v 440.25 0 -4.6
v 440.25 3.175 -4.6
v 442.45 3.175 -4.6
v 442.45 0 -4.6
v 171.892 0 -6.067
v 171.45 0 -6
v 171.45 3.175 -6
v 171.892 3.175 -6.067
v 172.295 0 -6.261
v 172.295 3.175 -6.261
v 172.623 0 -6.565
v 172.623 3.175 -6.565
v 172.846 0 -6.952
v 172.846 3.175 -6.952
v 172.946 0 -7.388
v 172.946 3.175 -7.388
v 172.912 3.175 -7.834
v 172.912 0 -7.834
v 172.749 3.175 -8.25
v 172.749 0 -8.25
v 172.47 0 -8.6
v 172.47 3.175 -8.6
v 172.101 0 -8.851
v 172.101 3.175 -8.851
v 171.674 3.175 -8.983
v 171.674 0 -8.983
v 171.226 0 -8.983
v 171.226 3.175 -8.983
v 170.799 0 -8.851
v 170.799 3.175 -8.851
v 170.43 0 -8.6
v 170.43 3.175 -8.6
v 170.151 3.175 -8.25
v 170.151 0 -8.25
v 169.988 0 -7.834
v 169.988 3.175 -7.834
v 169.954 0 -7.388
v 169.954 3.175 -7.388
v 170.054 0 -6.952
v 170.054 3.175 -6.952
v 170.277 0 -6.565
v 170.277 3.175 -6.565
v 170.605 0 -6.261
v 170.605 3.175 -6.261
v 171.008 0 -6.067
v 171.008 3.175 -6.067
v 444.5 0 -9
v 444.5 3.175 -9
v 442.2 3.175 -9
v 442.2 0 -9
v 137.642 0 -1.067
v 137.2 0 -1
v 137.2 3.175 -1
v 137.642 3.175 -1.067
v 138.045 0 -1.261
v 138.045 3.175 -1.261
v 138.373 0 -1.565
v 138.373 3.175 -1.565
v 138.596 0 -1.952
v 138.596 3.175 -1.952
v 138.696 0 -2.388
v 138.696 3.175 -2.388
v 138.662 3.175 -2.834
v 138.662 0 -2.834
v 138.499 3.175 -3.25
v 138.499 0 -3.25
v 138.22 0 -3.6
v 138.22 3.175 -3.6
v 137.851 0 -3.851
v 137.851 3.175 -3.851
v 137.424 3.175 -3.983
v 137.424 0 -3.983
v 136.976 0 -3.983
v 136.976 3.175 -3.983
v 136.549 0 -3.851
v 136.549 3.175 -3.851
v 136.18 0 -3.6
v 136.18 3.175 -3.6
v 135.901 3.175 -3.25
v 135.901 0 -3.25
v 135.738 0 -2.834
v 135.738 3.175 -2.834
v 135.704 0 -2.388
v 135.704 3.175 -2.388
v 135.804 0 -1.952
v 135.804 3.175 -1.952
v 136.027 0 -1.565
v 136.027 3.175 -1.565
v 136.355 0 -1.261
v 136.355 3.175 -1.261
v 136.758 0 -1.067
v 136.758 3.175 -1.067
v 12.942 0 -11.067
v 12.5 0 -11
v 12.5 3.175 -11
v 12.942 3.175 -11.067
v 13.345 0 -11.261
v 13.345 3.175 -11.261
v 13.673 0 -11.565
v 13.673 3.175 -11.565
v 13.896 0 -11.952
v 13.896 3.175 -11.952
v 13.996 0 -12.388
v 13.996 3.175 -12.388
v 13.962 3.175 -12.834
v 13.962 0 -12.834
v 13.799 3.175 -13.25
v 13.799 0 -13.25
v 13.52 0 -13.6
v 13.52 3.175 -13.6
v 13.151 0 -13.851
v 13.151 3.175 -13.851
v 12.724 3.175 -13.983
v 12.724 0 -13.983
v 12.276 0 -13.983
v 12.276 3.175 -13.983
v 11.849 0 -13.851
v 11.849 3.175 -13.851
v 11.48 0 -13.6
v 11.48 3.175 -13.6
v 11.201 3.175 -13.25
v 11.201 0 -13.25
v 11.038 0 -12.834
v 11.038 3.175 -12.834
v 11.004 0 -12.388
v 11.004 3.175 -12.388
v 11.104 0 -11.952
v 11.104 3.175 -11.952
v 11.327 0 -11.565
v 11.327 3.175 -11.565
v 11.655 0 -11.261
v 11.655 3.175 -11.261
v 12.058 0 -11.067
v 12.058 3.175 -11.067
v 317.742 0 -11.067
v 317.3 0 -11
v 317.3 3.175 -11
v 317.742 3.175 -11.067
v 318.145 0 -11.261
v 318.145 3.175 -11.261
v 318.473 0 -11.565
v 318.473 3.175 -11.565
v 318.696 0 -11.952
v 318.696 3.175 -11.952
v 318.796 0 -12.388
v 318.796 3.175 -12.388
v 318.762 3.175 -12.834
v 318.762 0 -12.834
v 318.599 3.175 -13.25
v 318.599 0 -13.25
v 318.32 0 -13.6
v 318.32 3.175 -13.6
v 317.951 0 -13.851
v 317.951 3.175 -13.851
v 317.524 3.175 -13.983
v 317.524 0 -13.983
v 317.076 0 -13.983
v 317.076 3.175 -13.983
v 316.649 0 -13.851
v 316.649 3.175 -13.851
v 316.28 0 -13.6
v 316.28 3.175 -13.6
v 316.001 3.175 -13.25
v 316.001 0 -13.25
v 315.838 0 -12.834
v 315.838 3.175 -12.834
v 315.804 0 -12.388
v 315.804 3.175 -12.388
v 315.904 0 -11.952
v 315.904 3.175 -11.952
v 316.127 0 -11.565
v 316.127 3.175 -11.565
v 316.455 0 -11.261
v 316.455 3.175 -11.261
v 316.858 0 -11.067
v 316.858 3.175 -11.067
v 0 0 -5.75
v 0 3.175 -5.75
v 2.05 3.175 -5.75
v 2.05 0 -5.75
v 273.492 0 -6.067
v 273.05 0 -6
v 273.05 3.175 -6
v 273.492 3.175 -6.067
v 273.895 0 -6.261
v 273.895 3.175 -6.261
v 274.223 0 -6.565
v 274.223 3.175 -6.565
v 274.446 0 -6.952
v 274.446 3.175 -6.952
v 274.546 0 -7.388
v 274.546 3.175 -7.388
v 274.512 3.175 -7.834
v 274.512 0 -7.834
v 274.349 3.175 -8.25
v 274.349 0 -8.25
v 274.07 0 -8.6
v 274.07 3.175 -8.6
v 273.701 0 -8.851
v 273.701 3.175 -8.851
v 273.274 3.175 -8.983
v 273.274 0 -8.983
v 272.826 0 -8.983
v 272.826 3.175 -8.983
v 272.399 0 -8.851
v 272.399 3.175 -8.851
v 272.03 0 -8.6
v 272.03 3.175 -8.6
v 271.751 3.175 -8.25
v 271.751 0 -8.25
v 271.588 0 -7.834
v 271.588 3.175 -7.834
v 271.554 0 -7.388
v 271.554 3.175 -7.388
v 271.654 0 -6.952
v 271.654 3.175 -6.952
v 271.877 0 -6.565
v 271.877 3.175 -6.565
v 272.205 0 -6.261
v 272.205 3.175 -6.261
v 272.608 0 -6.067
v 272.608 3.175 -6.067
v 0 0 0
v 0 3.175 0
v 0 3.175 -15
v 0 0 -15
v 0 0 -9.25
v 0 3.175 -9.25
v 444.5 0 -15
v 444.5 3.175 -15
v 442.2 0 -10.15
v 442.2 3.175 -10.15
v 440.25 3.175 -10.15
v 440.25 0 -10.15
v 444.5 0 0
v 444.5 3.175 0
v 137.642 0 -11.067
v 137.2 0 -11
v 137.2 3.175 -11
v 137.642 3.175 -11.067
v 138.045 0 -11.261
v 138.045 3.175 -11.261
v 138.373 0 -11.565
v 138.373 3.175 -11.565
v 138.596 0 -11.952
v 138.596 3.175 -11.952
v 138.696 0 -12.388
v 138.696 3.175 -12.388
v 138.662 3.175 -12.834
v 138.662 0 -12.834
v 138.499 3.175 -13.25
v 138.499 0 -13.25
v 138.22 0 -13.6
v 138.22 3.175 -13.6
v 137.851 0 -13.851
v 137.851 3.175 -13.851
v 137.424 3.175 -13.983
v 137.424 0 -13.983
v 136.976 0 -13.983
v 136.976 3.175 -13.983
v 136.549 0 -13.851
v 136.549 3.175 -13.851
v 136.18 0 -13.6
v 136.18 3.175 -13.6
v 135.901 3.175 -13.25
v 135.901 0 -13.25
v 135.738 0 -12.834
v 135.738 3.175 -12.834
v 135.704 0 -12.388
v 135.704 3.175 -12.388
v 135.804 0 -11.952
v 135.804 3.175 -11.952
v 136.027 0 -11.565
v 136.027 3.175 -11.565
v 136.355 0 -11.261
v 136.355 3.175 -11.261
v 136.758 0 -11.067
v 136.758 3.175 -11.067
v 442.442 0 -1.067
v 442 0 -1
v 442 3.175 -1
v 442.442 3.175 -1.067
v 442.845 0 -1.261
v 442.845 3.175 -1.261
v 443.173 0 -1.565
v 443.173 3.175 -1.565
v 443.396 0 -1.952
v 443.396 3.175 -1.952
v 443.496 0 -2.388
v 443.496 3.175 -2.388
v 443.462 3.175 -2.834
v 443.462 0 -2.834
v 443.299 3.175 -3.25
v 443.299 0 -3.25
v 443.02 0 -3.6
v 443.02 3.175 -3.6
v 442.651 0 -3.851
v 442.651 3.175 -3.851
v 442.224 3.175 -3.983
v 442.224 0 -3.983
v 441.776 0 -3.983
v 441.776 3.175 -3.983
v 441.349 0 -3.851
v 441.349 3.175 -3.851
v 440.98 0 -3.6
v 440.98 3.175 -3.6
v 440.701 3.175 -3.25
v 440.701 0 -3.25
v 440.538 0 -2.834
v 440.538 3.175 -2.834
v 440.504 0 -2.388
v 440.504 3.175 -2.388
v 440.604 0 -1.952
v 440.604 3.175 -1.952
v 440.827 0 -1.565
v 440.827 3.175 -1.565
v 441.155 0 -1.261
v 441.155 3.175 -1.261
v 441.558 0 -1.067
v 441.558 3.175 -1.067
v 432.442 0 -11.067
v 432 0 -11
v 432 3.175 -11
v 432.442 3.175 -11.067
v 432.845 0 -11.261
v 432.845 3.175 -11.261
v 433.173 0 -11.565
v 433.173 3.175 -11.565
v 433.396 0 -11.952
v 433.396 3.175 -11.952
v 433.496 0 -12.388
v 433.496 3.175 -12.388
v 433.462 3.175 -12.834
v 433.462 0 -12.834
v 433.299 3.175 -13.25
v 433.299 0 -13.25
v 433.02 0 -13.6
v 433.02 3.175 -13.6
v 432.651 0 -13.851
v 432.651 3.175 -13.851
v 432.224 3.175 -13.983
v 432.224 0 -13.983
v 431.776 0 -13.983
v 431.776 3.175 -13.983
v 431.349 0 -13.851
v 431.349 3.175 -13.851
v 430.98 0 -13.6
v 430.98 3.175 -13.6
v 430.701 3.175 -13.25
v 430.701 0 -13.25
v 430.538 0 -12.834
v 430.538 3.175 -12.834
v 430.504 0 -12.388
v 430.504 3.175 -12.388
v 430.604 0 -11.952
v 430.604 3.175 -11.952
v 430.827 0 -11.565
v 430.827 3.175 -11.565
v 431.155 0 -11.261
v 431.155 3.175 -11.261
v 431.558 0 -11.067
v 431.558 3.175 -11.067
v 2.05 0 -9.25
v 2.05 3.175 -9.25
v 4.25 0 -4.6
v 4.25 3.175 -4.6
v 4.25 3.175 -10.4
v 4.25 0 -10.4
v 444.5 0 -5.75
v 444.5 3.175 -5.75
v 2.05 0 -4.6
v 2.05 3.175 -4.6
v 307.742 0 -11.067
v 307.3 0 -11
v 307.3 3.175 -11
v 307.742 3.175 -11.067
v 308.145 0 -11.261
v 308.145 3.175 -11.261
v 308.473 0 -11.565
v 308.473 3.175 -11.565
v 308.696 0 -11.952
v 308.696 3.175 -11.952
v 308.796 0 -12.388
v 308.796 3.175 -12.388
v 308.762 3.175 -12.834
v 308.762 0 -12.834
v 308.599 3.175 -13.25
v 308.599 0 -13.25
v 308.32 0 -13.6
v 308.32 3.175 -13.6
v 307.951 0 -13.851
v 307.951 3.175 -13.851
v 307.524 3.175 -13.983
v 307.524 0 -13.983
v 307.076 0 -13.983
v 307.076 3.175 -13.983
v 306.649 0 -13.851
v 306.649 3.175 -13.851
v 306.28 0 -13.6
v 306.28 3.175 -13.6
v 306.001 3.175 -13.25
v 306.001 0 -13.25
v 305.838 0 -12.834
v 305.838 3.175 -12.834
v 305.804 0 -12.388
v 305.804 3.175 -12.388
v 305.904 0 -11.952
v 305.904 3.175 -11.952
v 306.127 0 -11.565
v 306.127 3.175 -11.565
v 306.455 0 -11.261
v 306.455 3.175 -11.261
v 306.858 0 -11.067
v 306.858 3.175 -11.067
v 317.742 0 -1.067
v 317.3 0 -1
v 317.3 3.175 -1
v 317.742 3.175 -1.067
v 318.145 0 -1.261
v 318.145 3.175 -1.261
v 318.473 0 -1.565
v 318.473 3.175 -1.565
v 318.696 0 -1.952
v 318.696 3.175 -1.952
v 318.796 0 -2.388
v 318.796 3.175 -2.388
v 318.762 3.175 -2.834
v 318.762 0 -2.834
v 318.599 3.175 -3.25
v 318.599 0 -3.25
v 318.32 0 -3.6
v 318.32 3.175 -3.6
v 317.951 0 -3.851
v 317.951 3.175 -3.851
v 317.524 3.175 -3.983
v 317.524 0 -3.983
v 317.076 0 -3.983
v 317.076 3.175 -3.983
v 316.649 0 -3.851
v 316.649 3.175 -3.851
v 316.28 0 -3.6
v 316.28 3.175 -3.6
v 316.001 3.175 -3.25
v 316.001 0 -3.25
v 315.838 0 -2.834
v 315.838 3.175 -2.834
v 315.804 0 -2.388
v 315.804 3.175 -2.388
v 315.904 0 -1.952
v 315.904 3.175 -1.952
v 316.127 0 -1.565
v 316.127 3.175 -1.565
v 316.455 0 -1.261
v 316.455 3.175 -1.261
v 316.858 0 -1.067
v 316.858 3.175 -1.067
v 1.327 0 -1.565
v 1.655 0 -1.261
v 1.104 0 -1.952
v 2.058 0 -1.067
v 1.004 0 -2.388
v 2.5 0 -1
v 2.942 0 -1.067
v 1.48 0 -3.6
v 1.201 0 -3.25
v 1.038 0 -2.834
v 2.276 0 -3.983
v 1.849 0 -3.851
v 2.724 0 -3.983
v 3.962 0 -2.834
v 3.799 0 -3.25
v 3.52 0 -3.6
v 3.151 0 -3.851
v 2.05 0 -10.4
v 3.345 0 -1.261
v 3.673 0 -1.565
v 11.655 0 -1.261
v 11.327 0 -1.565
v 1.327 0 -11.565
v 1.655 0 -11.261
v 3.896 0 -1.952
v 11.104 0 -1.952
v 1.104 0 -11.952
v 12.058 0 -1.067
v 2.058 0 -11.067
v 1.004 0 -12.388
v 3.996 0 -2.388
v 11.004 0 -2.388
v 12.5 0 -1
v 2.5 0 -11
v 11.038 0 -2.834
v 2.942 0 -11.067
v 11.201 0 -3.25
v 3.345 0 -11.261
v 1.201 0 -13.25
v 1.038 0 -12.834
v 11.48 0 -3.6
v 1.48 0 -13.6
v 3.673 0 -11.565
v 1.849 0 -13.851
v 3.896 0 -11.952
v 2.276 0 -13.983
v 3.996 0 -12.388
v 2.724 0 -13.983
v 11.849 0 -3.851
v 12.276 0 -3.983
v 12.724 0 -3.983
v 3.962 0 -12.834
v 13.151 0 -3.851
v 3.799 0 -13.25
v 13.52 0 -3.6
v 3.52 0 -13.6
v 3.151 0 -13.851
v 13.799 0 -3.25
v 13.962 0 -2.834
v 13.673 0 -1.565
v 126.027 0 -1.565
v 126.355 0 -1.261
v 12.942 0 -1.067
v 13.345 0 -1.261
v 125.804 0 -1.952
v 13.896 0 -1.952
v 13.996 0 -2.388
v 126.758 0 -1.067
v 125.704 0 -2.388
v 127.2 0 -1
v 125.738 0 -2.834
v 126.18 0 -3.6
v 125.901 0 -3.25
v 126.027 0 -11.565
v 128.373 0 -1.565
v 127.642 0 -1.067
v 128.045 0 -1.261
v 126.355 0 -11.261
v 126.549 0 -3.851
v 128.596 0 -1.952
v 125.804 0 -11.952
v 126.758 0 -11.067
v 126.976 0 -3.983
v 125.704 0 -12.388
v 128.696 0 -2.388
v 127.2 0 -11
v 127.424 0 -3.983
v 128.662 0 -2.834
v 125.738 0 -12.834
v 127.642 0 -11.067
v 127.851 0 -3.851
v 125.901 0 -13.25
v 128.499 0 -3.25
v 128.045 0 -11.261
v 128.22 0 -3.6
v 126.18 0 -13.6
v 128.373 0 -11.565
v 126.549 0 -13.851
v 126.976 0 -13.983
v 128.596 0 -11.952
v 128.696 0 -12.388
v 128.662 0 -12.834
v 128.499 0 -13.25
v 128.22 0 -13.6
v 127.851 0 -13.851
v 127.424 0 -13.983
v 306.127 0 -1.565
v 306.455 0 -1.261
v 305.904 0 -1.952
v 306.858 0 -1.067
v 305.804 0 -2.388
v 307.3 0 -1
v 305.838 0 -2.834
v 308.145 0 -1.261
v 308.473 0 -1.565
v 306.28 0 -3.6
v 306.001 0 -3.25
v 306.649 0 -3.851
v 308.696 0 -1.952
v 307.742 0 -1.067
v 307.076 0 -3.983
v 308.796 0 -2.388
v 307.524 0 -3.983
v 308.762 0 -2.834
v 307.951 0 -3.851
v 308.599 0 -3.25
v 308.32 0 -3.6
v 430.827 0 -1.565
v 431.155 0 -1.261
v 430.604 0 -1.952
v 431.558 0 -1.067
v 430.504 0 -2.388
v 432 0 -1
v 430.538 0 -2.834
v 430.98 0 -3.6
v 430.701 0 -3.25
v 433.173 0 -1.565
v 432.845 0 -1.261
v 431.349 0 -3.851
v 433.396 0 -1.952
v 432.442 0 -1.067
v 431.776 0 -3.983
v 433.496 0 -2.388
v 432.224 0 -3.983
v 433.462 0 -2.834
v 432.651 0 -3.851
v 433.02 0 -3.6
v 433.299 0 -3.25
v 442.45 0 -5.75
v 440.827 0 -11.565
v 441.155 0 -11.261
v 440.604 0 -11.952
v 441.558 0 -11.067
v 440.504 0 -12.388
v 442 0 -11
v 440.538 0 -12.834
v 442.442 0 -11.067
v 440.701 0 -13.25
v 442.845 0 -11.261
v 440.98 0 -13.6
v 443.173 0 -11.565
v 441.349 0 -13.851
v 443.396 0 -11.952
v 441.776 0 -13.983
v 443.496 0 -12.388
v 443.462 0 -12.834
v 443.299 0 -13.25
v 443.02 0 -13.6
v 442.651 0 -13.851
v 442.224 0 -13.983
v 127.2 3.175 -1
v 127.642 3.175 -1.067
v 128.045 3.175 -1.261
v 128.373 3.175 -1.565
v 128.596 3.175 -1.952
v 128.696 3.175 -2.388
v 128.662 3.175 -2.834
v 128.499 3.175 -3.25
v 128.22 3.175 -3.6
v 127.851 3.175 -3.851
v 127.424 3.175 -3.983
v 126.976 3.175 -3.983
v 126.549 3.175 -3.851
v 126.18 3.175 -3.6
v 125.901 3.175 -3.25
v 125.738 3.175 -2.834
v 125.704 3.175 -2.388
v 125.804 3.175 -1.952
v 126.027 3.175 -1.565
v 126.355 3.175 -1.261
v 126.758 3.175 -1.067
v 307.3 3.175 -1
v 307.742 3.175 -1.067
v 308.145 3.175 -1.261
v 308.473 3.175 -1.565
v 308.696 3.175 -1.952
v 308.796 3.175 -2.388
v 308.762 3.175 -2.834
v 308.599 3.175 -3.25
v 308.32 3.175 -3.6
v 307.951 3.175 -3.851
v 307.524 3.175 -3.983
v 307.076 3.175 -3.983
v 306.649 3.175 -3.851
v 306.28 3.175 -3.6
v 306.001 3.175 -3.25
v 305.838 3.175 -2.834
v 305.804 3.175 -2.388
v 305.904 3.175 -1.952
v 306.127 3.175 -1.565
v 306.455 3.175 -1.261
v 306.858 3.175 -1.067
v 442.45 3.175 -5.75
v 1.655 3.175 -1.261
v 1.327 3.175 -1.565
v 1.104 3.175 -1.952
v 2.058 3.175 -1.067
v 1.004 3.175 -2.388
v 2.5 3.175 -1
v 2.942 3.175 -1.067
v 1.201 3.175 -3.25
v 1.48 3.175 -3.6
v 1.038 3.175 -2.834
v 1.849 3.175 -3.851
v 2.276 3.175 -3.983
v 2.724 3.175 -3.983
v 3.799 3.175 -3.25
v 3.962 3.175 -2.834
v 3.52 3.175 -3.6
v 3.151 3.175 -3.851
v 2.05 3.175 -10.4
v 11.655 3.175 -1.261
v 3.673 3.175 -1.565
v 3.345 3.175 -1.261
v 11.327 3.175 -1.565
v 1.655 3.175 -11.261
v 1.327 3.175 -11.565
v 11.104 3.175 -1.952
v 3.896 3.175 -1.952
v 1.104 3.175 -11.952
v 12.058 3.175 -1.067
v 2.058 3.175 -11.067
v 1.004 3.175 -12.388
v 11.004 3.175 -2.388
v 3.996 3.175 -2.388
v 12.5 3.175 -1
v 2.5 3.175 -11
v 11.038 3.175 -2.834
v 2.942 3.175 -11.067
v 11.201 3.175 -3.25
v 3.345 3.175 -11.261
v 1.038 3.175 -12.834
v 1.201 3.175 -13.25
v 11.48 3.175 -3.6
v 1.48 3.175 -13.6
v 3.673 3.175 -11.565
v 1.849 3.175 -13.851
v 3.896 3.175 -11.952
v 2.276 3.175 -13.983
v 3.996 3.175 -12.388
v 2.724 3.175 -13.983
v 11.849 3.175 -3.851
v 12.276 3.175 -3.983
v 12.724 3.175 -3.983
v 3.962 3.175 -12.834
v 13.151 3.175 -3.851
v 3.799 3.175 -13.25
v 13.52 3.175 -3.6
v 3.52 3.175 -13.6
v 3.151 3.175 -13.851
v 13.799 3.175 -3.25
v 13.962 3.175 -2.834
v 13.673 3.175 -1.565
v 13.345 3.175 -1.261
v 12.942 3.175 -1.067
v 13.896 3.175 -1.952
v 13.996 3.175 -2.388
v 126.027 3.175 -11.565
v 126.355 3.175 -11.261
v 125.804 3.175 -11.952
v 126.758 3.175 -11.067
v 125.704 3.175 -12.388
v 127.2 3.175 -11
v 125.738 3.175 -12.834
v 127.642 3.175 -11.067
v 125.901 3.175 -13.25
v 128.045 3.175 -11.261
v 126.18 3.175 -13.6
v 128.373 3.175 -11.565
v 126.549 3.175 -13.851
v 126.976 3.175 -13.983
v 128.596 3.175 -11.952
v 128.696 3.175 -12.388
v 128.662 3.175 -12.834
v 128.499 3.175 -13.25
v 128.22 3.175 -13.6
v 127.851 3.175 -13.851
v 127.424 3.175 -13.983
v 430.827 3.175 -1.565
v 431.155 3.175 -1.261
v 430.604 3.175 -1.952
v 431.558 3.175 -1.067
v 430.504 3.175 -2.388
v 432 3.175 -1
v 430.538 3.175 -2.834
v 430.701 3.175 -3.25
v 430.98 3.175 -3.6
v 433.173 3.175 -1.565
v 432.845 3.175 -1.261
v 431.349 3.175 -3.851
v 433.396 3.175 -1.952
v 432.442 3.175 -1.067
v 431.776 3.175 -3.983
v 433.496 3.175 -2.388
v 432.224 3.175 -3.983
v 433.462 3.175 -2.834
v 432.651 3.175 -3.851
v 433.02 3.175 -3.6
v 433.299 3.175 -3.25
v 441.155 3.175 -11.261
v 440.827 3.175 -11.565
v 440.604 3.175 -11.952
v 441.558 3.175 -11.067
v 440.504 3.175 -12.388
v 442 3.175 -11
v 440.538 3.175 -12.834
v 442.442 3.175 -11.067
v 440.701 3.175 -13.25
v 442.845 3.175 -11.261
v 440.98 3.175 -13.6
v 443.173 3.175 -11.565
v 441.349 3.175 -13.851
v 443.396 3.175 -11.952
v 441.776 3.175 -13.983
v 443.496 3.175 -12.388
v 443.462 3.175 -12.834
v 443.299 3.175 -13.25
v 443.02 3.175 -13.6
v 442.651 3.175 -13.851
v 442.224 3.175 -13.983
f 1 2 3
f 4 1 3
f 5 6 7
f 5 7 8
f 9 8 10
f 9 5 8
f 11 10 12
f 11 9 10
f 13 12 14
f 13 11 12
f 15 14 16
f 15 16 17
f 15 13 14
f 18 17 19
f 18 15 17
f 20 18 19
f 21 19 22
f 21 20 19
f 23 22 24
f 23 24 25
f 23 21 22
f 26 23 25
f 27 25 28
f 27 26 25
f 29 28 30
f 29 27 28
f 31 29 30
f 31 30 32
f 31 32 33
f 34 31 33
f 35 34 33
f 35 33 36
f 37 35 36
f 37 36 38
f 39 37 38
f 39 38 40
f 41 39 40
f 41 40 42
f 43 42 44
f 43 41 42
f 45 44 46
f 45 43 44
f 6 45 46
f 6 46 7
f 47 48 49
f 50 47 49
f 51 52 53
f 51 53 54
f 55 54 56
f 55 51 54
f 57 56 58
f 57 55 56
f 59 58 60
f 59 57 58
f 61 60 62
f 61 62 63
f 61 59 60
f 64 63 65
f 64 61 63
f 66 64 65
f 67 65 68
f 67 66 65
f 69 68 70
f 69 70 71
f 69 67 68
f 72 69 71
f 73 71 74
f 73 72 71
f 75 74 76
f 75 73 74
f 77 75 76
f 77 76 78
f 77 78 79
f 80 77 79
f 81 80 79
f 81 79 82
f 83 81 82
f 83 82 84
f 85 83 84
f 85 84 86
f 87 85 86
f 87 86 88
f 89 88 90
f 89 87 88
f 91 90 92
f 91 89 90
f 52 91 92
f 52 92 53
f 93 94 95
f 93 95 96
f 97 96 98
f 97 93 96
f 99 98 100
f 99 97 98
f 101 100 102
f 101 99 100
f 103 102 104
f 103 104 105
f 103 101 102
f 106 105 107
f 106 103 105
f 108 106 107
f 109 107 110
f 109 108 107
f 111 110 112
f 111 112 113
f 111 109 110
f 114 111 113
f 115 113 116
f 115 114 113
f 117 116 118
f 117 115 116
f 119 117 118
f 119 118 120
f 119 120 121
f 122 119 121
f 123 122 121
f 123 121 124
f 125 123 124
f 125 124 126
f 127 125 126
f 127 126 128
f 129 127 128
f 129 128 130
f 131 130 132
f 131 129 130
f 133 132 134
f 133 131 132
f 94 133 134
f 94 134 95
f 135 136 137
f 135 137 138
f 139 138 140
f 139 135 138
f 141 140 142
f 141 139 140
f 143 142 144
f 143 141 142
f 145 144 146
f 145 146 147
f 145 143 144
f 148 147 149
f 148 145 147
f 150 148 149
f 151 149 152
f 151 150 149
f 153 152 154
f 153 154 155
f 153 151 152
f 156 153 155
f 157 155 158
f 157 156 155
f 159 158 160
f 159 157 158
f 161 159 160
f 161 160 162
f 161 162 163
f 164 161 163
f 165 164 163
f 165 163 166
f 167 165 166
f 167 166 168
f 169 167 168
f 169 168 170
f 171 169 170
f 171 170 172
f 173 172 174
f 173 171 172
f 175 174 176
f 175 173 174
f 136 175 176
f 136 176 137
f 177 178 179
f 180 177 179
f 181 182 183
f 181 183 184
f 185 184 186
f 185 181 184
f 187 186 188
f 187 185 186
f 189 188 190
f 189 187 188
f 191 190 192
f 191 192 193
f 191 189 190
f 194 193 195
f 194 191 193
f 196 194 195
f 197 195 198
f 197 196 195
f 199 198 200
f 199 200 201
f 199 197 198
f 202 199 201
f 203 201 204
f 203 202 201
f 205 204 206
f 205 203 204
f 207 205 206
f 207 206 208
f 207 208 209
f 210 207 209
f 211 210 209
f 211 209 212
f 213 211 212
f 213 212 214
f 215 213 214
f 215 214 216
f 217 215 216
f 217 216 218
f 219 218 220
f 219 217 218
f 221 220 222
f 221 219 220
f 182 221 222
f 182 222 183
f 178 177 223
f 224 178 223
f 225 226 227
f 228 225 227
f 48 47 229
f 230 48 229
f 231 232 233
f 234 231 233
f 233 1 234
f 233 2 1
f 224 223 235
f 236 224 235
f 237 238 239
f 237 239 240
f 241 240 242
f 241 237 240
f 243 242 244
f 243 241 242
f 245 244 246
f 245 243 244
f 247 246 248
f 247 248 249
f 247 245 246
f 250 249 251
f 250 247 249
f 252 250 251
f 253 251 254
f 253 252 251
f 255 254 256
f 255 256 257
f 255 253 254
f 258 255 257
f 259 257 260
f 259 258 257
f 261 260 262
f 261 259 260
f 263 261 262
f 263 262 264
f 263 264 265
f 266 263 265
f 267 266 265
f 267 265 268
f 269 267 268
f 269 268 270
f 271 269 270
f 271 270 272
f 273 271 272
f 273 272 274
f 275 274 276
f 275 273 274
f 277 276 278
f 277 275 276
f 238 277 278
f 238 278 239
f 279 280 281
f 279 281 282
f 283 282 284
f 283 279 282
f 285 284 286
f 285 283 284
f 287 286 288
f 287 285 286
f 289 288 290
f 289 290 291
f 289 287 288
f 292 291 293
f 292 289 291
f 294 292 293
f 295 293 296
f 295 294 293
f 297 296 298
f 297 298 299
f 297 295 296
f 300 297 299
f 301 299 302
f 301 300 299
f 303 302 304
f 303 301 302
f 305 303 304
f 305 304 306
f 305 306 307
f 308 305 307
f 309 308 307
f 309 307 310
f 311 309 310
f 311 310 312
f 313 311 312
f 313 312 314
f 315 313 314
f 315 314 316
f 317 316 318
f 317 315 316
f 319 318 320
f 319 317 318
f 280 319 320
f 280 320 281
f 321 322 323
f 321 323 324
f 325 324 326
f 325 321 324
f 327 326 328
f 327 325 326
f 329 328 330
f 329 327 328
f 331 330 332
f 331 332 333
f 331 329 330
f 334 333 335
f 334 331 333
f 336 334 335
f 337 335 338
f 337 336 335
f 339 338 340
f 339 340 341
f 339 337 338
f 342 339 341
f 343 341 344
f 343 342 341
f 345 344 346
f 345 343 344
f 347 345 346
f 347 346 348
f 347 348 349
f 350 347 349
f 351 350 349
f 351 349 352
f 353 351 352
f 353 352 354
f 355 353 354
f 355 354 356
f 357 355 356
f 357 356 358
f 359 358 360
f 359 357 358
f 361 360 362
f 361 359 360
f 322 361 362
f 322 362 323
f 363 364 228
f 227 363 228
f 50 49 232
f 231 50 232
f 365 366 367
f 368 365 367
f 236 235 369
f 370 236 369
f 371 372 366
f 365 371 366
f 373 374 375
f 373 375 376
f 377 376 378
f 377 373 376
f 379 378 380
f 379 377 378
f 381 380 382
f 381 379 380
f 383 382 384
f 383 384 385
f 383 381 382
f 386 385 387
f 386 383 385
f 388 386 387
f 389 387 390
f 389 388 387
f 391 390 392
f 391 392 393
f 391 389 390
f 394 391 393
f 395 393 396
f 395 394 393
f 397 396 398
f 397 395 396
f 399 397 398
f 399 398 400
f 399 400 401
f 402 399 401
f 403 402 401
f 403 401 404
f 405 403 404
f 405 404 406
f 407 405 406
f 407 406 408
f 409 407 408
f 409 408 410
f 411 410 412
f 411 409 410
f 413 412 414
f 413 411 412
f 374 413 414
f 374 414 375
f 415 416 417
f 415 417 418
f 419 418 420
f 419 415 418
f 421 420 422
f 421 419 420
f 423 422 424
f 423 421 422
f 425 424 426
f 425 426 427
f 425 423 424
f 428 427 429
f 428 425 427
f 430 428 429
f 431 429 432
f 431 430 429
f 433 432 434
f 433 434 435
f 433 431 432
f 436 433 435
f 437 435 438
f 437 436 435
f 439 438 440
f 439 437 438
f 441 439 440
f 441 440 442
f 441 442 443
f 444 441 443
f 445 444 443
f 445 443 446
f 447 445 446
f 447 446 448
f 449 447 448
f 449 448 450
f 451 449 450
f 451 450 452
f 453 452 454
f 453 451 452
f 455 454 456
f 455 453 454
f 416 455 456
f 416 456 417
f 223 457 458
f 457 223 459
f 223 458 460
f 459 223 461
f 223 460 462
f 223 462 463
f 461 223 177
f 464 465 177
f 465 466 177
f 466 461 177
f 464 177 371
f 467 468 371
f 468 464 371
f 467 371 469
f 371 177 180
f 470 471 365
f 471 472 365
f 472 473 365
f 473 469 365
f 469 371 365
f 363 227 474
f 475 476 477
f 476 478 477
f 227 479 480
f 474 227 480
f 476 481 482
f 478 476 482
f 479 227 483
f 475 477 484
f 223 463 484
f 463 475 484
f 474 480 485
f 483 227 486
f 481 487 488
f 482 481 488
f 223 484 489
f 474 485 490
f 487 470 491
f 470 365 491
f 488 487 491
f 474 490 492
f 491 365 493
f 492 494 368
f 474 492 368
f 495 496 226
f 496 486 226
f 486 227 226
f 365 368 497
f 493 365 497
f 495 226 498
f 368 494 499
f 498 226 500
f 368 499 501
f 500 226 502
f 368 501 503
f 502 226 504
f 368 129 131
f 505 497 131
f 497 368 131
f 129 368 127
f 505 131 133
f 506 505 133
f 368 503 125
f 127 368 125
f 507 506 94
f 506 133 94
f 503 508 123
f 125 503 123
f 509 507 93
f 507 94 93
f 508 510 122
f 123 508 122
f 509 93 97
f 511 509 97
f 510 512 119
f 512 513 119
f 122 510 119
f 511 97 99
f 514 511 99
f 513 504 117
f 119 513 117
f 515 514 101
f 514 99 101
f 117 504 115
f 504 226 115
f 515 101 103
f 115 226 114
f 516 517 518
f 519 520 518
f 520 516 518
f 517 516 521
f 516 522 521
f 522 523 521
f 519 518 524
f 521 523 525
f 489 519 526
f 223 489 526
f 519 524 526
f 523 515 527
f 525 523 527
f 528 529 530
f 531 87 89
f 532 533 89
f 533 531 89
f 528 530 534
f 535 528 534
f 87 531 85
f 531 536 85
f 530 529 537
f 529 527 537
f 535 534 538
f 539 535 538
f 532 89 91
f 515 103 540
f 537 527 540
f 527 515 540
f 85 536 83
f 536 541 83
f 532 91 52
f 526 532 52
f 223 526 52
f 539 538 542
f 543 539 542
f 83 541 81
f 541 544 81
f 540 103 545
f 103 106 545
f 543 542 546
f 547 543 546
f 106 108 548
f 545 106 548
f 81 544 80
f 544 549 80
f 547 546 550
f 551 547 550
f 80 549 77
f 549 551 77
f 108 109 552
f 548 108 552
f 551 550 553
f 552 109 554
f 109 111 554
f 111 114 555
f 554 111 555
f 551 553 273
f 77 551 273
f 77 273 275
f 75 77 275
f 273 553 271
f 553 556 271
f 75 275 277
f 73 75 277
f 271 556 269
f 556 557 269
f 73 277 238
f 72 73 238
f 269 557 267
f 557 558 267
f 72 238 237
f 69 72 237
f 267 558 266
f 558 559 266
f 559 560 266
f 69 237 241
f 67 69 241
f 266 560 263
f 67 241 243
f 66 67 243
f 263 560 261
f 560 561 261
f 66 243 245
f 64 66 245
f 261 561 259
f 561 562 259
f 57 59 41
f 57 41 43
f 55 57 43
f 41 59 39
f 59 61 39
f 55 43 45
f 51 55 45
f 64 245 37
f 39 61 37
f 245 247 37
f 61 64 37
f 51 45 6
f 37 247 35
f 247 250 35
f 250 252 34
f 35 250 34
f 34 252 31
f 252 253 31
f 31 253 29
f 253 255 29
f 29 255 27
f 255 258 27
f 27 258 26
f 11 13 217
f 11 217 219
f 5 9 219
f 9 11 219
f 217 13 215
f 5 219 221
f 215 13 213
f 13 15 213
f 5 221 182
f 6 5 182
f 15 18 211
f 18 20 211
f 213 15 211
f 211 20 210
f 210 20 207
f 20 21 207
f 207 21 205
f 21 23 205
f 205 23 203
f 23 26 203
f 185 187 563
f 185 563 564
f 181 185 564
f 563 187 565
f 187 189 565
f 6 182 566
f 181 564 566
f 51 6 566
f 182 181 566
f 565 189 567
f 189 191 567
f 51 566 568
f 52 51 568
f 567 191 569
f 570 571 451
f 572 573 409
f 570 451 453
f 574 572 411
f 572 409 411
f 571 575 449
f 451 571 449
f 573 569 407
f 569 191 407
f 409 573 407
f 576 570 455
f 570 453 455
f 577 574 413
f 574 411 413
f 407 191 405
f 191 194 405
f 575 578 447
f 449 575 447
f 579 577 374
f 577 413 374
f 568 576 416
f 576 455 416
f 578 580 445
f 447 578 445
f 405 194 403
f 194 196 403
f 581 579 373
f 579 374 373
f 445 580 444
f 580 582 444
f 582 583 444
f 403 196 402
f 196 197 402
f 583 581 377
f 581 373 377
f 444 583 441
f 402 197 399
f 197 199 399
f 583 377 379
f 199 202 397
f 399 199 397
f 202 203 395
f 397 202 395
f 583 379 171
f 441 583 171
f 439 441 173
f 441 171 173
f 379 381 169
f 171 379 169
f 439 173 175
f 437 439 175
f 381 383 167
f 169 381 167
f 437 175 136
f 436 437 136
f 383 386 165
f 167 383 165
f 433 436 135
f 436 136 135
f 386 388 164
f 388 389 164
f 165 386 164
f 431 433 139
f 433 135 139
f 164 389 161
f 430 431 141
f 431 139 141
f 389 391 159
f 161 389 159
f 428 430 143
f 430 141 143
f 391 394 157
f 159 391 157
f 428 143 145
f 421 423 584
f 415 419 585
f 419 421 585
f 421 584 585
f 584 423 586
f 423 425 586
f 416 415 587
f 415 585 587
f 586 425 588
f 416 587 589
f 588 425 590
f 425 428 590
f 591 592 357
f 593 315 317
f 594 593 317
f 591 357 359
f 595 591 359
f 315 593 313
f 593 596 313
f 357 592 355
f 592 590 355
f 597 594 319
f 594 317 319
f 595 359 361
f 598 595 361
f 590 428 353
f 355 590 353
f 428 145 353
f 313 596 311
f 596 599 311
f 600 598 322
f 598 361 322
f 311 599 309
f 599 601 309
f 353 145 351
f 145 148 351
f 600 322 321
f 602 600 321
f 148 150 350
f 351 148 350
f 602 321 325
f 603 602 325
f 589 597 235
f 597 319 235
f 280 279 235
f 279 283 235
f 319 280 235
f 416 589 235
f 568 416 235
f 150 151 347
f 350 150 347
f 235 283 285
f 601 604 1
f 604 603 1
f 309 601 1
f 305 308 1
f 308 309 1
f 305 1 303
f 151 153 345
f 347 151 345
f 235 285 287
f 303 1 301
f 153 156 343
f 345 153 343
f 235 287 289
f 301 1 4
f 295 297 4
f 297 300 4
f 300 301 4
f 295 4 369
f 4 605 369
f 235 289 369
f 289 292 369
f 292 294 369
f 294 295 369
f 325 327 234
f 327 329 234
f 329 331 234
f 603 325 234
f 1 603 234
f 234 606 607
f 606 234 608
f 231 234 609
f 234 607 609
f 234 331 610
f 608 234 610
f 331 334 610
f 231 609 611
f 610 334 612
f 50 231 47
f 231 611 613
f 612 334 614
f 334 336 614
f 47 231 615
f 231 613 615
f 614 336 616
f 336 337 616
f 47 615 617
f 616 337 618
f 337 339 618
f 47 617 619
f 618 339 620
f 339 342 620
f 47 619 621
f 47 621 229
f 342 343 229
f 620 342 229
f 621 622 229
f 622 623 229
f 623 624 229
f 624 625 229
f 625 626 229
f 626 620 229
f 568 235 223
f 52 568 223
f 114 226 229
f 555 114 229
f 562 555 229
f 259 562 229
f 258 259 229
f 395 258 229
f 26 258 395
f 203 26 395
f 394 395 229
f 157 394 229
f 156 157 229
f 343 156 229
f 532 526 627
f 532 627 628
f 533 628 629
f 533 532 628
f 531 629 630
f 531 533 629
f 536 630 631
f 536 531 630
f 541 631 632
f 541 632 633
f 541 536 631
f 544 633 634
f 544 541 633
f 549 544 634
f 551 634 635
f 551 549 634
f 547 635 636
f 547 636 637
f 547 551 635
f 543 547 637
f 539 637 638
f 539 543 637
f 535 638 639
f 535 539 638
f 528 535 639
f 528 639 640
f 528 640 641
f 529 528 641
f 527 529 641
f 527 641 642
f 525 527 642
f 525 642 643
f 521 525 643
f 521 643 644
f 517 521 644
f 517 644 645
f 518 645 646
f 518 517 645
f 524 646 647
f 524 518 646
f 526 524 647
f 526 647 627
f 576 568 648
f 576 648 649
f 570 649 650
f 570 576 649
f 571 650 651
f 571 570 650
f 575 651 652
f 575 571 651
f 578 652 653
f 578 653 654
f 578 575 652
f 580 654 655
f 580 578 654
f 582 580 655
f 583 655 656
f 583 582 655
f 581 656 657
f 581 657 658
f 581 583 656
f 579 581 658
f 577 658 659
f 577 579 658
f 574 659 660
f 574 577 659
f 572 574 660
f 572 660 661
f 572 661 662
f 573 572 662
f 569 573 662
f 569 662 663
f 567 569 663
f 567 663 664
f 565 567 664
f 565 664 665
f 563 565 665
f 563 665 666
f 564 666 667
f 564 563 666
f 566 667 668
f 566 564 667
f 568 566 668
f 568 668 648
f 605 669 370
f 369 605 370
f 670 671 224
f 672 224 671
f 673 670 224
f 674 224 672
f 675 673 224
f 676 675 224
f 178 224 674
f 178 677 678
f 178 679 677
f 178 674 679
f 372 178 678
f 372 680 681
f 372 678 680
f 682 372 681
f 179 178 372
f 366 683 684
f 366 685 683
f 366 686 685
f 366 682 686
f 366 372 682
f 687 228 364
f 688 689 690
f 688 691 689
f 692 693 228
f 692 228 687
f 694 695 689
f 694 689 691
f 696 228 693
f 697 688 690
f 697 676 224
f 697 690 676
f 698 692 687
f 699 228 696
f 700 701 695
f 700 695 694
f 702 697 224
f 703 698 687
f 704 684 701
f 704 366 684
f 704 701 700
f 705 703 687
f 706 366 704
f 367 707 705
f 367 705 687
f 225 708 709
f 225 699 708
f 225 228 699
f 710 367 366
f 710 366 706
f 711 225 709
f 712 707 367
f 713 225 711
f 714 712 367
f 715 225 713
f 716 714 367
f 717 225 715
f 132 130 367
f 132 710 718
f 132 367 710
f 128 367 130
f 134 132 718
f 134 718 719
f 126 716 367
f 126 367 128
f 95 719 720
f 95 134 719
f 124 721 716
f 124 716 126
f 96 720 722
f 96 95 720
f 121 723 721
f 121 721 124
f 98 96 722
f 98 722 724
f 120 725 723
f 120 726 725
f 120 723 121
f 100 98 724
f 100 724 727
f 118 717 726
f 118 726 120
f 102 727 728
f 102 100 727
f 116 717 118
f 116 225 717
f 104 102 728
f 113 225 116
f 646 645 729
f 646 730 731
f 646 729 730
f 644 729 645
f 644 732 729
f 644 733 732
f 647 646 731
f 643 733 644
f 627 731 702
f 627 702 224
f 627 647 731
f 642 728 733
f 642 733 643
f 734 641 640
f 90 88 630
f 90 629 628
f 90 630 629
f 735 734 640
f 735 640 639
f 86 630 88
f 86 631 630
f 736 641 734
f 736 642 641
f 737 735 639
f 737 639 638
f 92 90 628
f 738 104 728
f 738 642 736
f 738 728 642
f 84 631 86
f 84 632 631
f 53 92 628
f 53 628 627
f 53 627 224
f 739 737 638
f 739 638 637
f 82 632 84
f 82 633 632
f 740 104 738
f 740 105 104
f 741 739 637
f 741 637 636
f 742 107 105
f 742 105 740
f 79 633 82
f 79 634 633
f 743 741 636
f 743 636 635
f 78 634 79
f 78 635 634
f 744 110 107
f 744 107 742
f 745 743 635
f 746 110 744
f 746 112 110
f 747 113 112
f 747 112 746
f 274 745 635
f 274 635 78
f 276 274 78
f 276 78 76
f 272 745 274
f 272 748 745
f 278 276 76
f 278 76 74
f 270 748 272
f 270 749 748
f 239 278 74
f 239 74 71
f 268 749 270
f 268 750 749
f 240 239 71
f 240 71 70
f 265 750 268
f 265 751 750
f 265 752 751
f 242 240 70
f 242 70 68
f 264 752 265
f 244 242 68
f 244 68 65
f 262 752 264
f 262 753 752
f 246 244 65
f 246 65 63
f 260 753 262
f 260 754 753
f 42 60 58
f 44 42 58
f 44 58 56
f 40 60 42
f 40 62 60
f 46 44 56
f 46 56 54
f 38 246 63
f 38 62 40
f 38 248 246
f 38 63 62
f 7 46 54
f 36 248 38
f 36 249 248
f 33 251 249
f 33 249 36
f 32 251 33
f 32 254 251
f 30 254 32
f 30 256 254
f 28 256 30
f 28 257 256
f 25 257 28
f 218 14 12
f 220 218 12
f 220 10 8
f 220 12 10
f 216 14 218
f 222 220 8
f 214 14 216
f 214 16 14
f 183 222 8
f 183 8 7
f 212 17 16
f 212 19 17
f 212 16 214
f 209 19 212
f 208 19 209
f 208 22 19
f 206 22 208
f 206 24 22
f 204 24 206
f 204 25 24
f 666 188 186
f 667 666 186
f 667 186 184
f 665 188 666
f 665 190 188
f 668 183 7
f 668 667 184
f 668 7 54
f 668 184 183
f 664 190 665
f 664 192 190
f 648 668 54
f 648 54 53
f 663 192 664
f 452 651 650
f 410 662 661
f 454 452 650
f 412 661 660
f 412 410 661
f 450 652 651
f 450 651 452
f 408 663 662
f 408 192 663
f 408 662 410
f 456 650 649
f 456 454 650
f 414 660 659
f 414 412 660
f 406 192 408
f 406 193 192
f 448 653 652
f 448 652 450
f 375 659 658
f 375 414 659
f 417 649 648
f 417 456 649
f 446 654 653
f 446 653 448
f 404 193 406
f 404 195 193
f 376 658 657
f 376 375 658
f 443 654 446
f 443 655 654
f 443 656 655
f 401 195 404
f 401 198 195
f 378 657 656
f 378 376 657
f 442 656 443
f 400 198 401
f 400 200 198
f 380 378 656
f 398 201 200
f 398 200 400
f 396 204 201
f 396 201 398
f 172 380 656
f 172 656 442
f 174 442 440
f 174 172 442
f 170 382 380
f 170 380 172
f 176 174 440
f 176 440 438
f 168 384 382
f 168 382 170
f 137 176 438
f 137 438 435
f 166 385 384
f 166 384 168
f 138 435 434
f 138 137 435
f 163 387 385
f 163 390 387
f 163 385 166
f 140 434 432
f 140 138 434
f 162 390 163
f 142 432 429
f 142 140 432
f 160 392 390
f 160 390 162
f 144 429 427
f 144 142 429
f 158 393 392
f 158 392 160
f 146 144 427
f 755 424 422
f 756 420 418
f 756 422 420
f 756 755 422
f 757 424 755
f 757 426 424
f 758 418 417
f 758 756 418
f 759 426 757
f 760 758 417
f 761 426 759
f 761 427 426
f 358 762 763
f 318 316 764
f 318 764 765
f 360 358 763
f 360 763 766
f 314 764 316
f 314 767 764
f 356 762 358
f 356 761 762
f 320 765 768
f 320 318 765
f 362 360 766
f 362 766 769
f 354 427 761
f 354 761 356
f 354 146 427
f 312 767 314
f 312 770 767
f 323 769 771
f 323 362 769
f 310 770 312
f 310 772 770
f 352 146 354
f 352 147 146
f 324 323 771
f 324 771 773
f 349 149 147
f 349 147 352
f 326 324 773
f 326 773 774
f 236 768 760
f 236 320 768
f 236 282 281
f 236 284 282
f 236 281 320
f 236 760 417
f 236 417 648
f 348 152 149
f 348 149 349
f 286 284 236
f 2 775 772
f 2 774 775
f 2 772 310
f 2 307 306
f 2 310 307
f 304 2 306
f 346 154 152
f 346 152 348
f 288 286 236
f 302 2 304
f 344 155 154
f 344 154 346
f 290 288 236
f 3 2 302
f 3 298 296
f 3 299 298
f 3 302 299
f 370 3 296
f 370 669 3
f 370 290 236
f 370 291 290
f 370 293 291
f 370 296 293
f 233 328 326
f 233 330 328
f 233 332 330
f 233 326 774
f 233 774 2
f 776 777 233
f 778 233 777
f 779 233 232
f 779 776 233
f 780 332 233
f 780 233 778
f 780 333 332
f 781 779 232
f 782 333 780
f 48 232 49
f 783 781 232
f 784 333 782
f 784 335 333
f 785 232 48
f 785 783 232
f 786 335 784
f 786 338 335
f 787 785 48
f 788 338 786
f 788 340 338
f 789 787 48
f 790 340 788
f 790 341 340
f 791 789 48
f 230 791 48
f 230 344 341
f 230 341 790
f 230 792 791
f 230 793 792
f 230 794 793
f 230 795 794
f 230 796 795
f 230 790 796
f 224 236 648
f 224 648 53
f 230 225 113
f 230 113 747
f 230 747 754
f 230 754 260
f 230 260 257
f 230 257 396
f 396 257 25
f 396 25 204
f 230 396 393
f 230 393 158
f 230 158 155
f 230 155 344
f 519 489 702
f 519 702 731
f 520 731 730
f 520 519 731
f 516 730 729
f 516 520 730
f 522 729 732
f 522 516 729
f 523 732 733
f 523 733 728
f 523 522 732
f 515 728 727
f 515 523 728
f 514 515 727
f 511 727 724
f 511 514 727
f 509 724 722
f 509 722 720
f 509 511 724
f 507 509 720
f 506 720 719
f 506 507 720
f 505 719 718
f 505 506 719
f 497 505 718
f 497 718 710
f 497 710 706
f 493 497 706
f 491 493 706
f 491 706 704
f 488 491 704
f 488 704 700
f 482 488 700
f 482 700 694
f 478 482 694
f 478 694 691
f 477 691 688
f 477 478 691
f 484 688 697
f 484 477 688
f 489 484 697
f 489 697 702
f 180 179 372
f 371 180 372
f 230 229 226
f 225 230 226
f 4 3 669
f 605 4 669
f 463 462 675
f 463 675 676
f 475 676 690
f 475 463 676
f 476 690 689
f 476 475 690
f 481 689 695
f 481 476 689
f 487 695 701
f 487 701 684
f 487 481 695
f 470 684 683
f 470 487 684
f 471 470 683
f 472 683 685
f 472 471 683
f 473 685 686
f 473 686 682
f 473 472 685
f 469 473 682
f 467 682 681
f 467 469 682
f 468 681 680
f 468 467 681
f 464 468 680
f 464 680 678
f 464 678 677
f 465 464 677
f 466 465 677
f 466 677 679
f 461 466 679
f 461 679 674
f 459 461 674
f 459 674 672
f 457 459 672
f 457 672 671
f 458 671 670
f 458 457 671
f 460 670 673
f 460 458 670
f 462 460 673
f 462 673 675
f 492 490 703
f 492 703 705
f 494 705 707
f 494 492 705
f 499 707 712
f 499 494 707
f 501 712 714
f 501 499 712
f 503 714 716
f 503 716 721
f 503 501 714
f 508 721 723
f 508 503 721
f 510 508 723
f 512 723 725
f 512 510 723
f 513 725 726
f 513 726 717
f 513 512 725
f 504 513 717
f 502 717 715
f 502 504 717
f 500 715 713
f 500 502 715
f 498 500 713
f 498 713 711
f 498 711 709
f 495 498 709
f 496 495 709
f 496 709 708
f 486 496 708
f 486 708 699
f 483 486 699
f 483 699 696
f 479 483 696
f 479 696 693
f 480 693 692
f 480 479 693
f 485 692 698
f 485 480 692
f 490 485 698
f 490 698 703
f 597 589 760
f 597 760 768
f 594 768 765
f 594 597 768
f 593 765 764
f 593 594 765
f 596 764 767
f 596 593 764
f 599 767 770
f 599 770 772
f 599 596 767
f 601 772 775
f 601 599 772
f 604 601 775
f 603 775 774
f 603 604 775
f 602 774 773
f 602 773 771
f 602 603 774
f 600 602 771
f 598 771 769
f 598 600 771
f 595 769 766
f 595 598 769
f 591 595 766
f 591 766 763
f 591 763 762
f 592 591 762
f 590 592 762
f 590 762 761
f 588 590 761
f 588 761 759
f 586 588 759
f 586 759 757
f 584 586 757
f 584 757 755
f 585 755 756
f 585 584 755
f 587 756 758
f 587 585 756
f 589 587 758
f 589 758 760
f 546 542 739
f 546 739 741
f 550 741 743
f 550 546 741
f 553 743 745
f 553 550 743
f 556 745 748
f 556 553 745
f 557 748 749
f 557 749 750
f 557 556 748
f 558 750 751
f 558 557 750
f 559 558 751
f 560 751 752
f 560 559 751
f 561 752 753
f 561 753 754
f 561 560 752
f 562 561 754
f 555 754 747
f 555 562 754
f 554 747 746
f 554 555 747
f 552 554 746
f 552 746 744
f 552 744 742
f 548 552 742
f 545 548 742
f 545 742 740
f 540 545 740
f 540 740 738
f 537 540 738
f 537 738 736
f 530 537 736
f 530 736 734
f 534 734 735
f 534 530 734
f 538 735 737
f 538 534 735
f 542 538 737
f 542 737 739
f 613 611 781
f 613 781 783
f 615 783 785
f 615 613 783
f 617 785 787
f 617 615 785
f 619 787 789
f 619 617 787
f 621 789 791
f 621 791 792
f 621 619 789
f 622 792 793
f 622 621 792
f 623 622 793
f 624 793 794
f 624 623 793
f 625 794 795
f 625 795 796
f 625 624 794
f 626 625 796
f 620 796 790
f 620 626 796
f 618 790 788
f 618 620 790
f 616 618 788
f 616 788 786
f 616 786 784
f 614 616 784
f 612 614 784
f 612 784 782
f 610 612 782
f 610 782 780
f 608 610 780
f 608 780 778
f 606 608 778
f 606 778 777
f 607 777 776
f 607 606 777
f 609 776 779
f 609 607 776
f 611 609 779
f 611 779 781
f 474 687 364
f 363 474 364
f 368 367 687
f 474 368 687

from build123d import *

# Parameters (mm, degrees)
SKETCH1_R           = 1.5
BOSS_EXTRUDE1_DEPTH = 3.175
CUT_EXTRUDE2_DEPTH  = 10
SKETCH6_W           = 2.65
SKETCH6_H           = 3.175
CUT_EXTRUDE3_DEPTH  = 0.25


with BuildPart() as part:
    # Sketch1 → Boss-Extrude1 (new body)
    with BuildSketch(Plane(origin=(0, 0, 0), x_dir=(1, 0, 0), z_dir=(0, 1, 0))):
        Polygon((0, 7.5), (0, 0), (444.5, 0), (444.5, 15), (0, 15), align=None)
        with Locations(Location((2.5, 2.5, 0), (0, 0, 270))):
            Circle(SKETCH1_R, mode=Mode.SUBTRACT)
        with Locations(Location((12.5, 2.5, 0), (0, 0, 270))):
            Circle(SKETCH1_R, mode=Mode.SUBTRACT)
        with Locations(Location((127.2, 2.5, 0), (0, 0, 270))):
            Circle(SKETCH1_R, mode=Mode.SUBTRACT)
        with Locations(Location((137.2, 2.5, 0), (0, 0, 270))):
            Circle(SKETCH1_R, mode=Mode.SUBTRACT)
        with Locations(Location((2.5, 12.5, 0), (0, 0, 270))):
            Circle(SKETCH1_R, mode=Mode.SUBTRACT)
        with Locations(Location((12.5, 12.5, 0), (0, 0, 270))):
            Circle(SKETCH1_R, mode=Mode.SUBTRACT)
        with Locations(Location((127.2, 12.5, 0), (0, 0, 270))):
            Circle(SKETCH1_R, mode=Mode.SUBTRACT)
        with Locations(Location((137.2, 12.5, 0), (0, 0, 270))):
            Circle(SKETCH1_R, mode=Mode.SUBTRACT)
        with Locations(Location((171.45, 7.5, 0), (0, 0, 270))):
            Circle(SKETCH1_R, mode=Mode.SUBTRACT)
        with Locations(Location((273.05, 7.5, 0), (0, 0, 270))):
            Circle(SKETCH1_R, mode=Mode.SUBTRACT)
        with Locations(Location((442, 12.5, 0), (0, 0, 270))):
            Circle(SKETCH1_R, mode=Mode.SUBTRACT)
        with Locations(Location((307.3, 2.5, 0), (0, 0, 270))):
            Circle(SKETCH1_R, mode=Mode.SUBTRACT)
        with Locations(Location((317.3, 2.5, 0), (0, 0, 270))):
            Circle(SKETCH1_R, mode=Mode.SUBTRACT)
        with Locations(Location((432, 2.5, 0), (0, 0, 270))):
            Circle(SKETCH1_R, mode=Mode.SUBTRACT)
        with Locations(Location((442, 2.5, 0), (0, 0, 270))):
            Circle(SKETCH1_R, mode=Mode.SUBTRACT)
        with Locations(Location((307.3, 12.5, 0), (0, 0, 270))):
            Circle(SKETCH1_R, mode=Mode.SUBTRACT)
        with Locations(Location((317.3, 12.5, 0), (0, 0, 270))):
            Circle(SKETCH1_R, mode=Mode.SUBTRACT)
        with Locations(Location((432, 12.5, 0), (0, 0, 270))):
            Circle(SKETCH1_R, mode=Mode.SUBTRACT)
    extrude(amount=BOSS_EXTRUDE1_DEPTH)

    # Sketch4 → Cut-Extrude2 (cut)
    with BuildSketch(Plane(origin=(0, 3.175, 0), x_dir=(1, 0, 0), z_dir=(0, 1, 0))):
        Polygon((444.5, 5.75), (444.5, 7.5), (440.5, 7.5), (440.25, 7.5), (440.25, 4.6), (442.45, 4.6), (442.45, 5.75), align=None)
        Polygon((440.5, 7.5), (444.5, 7.5), (444.5, 9), (442.2, 9), (442.2, 10.15), (440.5, 10.15), align=None)
        Polygon((2.05, 9.25), (0, 9.25), (0, 5.75), (2.05, 5.75), (2.05, 4.6), (4.25, 4.6), (4.25, 7.5), (4.25, 10.4), (2.05, 10.4), align=None)
    extrude(amount=-CUT_EXTRUDE2_DEPTH, mode=Mode.SUBTRACT)

    # Sketch6 → Cut-Extrude3 (cut)
    with BuildSketch(Plane(origin=(440.5, 0, 0), x_dir=(0, 0, -1), z_dir=(1, 0, 0))):
        with Locations((8.825, 1.5875)):
            Rectangle(SKETCH6_W, SKETCH6_H)
    extrude(amount=-CUT_EXTRUDE3_DEPTH, mode=Mode.SUBTRACT)


solid = part.part
